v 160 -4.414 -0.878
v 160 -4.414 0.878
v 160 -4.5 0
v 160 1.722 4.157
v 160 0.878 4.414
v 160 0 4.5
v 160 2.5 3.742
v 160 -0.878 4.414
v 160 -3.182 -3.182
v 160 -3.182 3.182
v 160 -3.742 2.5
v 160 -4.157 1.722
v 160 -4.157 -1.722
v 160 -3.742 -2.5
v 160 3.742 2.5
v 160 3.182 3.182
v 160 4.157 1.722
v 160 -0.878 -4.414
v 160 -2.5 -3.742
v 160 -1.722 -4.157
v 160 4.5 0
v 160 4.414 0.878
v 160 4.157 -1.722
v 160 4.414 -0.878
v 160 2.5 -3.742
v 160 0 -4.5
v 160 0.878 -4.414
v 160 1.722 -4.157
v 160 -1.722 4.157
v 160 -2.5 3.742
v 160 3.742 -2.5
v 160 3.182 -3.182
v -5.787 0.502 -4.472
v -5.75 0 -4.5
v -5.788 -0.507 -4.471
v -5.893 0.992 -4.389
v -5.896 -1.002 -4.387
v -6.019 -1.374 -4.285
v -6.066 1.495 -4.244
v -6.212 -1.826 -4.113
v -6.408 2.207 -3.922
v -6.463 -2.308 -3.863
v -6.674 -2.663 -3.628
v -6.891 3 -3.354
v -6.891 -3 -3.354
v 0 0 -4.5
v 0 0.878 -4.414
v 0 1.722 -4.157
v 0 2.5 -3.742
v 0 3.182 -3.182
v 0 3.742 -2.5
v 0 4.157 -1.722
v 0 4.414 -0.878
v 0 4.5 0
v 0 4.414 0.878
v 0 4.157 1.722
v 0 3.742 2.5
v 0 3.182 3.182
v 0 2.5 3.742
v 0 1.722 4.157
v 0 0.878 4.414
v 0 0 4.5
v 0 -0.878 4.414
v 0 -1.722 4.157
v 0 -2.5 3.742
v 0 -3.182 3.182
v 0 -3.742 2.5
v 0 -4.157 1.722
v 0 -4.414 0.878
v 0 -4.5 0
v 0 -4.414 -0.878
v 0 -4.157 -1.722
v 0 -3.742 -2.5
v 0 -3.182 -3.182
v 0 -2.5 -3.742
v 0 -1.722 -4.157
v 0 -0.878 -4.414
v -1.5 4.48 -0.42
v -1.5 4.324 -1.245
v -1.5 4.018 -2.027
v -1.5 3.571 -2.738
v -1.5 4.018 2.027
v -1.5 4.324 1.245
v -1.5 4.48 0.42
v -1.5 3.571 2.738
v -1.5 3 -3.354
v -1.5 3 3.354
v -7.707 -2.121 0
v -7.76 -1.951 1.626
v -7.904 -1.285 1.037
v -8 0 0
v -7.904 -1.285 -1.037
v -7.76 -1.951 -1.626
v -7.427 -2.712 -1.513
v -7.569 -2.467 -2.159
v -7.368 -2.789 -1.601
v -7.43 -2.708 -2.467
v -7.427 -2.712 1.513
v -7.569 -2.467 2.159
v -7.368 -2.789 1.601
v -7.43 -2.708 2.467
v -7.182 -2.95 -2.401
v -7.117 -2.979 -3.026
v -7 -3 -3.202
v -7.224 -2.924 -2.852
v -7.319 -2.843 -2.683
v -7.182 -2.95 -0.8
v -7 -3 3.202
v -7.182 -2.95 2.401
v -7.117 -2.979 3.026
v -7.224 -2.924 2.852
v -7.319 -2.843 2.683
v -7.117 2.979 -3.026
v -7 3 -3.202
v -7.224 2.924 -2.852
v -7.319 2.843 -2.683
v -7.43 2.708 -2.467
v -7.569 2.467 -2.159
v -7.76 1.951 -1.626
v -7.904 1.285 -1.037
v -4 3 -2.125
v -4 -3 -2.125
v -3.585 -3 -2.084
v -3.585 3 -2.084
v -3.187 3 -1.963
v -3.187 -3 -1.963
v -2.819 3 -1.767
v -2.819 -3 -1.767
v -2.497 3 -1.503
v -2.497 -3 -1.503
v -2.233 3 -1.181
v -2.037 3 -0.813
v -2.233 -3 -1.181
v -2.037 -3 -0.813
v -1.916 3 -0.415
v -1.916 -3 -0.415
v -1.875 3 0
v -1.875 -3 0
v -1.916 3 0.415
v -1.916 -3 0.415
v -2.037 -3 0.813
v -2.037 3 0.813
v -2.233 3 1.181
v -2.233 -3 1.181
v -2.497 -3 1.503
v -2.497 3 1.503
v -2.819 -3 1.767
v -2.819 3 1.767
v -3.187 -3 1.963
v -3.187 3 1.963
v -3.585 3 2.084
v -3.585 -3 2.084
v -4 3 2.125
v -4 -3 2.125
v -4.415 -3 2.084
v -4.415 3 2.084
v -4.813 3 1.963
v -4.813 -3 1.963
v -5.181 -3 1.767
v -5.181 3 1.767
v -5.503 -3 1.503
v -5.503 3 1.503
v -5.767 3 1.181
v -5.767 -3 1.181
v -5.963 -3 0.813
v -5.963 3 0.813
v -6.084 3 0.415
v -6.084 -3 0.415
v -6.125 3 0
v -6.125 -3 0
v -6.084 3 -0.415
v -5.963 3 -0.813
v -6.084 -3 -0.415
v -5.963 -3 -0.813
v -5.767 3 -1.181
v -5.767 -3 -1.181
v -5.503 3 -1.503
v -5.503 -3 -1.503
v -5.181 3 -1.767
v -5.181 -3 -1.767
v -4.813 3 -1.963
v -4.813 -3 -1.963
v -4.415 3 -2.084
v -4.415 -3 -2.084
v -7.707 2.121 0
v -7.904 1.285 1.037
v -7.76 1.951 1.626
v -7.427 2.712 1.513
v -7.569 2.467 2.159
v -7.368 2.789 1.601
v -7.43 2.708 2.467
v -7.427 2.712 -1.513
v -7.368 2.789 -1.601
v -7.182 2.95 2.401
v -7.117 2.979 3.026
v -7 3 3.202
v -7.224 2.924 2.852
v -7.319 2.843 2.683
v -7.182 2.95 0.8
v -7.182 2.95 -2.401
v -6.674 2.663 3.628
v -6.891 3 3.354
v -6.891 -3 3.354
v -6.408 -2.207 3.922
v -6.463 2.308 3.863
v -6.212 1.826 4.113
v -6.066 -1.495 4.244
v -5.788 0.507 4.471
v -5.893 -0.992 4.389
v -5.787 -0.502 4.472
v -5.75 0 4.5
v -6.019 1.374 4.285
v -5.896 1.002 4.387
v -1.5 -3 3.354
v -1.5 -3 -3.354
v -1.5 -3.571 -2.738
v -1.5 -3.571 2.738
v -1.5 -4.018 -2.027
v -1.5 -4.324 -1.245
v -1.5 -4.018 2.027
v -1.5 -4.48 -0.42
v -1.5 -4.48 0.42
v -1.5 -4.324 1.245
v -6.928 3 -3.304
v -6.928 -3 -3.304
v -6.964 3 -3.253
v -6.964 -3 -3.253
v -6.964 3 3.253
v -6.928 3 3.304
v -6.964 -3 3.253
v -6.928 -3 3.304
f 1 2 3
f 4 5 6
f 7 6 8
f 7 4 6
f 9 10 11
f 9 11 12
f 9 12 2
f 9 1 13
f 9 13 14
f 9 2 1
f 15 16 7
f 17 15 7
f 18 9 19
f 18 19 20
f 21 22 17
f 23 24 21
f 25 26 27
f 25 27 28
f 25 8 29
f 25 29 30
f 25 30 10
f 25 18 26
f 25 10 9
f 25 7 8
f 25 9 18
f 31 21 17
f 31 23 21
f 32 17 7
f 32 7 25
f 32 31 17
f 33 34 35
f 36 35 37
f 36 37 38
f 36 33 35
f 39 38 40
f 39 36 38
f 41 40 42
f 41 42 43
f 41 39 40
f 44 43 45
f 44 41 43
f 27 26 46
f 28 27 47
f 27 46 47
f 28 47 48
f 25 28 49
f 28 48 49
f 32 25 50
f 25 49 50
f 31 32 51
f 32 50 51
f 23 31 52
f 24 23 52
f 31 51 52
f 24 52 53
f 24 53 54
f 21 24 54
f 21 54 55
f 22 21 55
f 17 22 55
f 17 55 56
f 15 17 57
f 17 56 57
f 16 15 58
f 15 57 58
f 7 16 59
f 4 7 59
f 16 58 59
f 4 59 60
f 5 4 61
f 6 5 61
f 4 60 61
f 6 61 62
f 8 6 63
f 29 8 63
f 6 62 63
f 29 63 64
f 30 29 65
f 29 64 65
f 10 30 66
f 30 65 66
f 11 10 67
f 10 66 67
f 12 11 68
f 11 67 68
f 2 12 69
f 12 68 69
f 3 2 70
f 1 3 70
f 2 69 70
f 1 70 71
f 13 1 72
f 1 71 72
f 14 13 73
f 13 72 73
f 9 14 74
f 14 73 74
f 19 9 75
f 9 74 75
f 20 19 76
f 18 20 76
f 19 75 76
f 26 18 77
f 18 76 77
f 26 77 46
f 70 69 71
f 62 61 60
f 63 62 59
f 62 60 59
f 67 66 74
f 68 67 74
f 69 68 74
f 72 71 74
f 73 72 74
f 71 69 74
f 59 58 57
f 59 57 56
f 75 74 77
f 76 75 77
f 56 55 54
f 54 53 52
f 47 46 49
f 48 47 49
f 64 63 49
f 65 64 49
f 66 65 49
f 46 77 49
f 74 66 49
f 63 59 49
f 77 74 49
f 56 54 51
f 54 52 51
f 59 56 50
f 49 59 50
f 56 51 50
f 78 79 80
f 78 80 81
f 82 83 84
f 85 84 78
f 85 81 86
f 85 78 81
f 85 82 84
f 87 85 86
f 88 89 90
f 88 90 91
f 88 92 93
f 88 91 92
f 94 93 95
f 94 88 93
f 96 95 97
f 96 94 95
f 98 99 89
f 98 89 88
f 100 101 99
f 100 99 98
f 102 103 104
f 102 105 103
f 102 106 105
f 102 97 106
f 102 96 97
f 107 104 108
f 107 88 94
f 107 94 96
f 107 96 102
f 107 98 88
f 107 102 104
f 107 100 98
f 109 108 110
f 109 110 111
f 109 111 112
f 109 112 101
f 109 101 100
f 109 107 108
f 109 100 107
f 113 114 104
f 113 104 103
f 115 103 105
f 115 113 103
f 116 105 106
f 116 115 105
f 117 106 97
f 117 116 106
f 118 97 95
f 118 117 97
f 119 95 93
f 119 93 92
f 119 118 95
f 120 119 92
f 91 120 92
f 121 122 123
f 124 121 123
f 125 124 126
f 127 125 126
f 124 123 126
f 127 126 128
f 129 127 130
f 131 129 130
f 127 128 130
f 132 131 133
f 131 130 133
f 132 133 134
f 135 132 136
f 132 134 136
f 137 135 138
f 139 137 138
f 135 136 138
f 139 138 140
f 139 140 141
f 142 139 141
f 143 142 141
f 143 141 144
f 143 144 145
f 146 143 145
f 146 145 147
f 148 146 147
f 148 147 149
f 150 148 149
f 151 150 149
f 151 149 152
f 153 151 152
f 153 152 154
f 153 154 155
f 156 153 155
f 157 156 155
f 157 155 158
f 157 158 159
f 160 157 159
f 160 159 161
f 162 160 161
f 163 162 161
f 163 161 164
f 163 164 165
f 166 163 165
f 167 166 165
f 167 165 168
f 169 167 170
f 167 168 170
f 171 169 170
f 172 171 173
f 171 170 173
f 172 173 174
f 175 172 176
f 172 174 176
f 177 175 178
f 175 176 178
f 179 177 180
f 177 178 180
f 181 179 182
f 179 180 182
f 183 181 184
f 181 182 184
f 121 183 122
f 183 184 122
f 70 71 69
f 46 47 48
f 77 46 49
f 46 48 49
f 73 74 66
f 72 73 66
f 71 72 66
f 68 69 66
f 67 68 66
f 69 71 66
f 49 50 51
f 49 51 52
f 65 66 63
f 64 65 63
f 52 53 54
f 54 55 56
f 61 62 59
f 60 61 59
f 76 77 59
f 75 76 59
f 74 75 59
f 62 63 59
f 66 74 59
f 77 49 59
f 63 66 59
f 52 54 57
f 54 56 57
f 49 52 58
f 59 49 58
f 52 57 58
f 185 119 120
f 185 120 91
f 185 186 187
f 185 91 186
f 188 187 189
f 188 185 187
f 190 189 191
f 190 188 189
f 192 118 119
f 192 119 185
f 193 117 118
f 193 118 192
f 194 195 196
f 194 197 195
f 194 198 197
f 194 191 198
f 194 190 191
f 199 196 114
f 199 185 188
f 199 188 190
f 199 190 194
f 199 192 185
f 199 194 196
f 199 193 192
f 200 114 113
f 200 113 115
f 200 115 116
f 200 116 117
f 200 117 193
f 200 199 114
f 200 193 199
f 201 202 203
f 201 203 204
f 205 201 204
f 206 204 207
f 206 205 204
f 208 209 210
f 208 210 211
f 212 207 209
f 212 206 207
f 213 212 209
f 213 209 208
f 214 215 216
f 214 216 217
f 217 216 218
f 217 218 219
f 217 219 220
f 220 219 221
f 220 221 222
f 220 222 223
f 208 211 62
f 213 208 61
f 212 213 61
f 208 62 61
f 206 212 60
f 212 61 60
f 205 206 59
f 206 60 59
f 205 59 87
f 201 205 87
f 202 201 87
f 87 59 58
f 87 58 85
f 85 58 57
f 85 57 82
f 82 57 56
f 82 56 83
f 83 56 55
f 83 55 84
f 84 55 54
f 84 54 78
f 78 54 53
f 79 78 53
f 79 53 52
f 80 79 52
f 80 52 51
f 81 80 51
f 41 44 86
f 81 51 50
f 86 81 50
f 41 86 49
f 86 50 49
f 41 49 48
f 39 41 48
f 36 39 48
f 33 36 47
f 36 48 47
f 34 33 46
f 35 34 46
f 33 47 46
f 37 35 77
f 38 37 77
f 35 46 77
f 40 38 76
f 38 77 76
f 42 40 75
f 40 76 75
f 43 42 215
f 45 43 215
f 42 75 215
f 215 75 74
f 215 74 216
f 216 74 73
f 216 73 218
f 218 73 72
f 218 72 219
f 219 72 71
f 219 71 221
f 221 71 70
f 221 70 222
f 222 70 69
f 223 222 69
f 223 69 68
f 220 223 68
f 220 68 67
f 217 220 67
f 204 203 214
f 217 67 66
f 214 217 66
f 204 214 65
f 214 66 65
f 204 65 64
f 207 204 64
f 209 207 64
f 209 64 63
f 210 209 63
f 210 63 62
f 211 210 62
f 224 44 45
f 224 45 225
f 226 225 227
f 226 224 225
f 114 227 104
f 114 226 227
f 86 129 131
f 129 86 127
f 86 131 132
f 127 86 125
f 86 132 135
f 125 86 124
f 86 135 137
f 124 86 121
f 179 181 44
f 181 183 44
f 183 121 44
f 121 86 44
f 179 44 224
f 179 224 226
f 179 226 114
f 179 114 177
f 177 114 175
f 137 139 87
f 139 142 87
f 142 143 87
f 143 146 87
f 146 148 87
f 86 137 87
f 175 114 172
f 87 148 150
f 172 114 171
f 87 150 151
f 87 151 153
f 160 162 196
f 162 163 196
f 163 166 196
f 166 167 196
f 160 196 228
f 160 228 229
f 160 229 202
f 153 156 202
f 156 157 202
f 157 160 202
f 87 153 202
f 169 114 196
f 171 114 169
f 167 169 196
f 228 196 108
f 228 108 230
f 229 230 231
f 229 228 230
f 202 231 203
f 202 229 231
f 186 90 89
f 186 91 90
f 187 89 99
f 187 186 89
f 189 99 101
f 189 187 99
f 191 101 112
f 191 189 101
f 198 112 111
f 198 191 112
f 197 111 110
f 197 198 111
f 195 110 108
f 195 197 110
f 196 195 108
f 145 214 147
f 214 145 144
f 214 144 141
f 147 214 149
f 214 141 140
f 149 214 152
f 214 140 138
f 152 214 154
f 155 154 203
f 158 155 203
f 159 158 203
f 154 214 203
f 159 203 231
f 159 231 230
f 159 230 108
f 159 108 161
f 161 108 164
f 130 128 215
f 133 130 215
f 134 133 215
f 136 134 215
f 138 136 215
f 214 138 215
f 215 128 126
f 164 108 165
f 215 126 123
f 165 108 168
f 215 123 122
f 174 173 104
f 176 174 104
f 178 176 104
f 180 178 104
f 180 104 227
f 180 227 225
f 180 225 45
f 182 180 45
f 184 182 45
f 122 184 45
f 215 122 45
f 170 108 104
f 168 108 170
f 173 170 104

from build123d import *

# Parameters (mm, degrees)
SKETCH2_R               = 4.5
BOSS_EXTRUDE1_DEPTH     = 160
SKETCH3_R               = 4.5
BOSS_EXTRUDE2_DEPTH     = 8
CUT_EXTRUDE1_DEPTH      = 6.5
SKETCH5_R               = 2.125
CUT_EXTRUDE2_DEPTH      = 161.23888417
FILLET2_SIZE            = 3
FILLET2_SIZE_2          = 1
FILLET3_SIZE            = 3
FILLET3_SIZE_2          = 1
CUT_EXTRUDE5_DEPTH      = 161.238884177
CUT_EXTRUDE5_DEPTH_BACK = 161.238884177


with BuildPart() as part:
    # Sketch2 → Boss-Extrude1 (new body)
    with BuildSketch(Plane(origin=(0, 0, 0), x_dir=(0, 0, -1), z_dir=(1, 0, 0))):
        Circle(SKETCH2_R)
    extrude(amount=BOSS_EXTRUDE1_DEPTH)


with BuildPart() as body_2:
    # Sketch3 → Boss-Extrude2 (new body)
    with BuildSketch(Plane.ZY):
        Circle(SKETCH3_R)
    extrude(amount=BOSS_EXTRUDE2_DEPTH)

    # Sketch4 → Cut-Extrude1 (cut)
    with BuildSketch(Plane.ZY.offset(8)):
        with BuildLine():
            ThreePointArc((3.354101966, 3), (0, 4.5), (-3.354101966, 3))
            Line((-3.354101966, 3), (3.354101966, 3))
        make_face()
        with BuildLine():
            Line((3.354101966, -3), (-3.354101966, -3))
            ThreePointArc((-3.354101966, -3), (0, -4.5), (3.354101966, -3))
        make_face()
    extrude(amount=-CUT_EXTRUDE1_DEPTH, mode=Mode.SUBTRACT)

    # Sketch5 → Cut-Extrude2 (cut, through all)
    with BuildSketch(Plane.XZ.offset(3)):
        with Locations(Location((-4, 0, 0), (0, 0, 270))):
            Circle(SKETCH5_R)
    extrude(amount=-CUT_EXTRUDE2_DEPTH, mode=Mode.SUBTRACT)

    # Fillet2
    # an asymmetric fillet: 3, 1 mm, written as the material it takes off along each edge
    with BuildSketch(Plane(origin=(-8, -3, 10.854101966), x_dir=(0, 1, 0), z_dir=(0, 0, -1))) as fillet2_piece_1:
        with BuildLine():
            Bezier((FILLET2_SIZE, 0), (0, 0), (0, FILLET2_SIZE_2), weights=[1, 0.707106781, 1])
            Line((0, FILLET2_SIZE_2), (0, 0))
            Line((0, 0), (FILLET2_SIZE, 0))
        make_face()
    extrude(amount=21.708203932, mode=Mode.SUBTRACT)

    # Fillet3
    # an asymmetric fillet: 3, 1 mm, written as the material it takes off along each edge
    with BuildSketch(Plane(origin=(-8, 3, -10.854101966), x_dir=(0, -1, 0), z_dir=(0, 0, 1))) as fillet3_piece_1:
        with BuildLine():
            Bezier((FILLET3_SIZE, 0), (0, 0), (0, FILLET3_SIZE_2), weights=[1, 0.707106781, 1])
            Line((0, FILLET3_SIZE_2), (0, 0))
            Line((0, 0), (FILLET3_SIZE, 0))
        make_face()
    extrude(amount=21.708203932, mode=Mode.SUBTRACT)

    # Sketch8 → Cut-Extrude5 (cut, two sides: drawn at the far end of the back side and taken through both)
    with BuildSketch(Plane.XZ.offset(3).offset(-CUT_EXTRUDE5_DEPTH_BACK)):
        with BuildLine():
            Line((-7, -3.354101966), (-6.890597967, -3.354101966))
            ThreePointArc((-6.890597967, -3.354101966), (-6.945935342, -3.278288441), (-7, -3.201562119))
            Line((-7, -3.201562119), (-7, -3.354101966))
        make_face()
        with BuildLine():
            Line((-8, -4.5), (-5.75, -4.5))
            ThreePointArc((-5.75, -4.5), (-6.361684668, -3.968245249), (-6.890597967, -3.354101966))
            Line((-6.890597967, -3.354101966), (-7, -3.354101966))
            Line((-7, -3.354101966), (-7, -3.201562119))
            ThreePointArc((-7, -3.201562119), (-7.744182899, -1.677050983), (-8, 0))
            Line((-8, 0), (-8, -4.5))
        make_face()
        with BuildLine():
            Line((-7, 3.354101966), (-7, 3.201562119))
            ThreePointArc((-7, 3.201562119), (-6.945935342, 3.278288441), (-6.890597967, 3.354101966))
            Line((-6.890597967, 3.354101966), (-7, 3.354101966))
        make_face()
        with BuildLine():
            Line((-8, 4.5), (-8, 0))
            ThreePointArc((-8, 0), (-7.744182899, 1.677050983), (-7, 3.201562119))
            Line((-7, 3.201562119), (-7, 3.354101966))
            Line((-7, 3.354101966), (-6.890597967, 3.354101966))
            ThreePointArc((-6.890597967, 3.354101966), (-6.361684668, 3.968245249), (-5.75, 4.5))
            Line((-5.75, 4.5), (-8, 4.5))
        make_face()
    extrude(amount=CUT_EXTRUDE5_DEPTH + CUT_EXTRUDE5_DEPTH_BACK, mode=Mode.SUBTRACT)


solid = Compound([part.part, body_2.part])
